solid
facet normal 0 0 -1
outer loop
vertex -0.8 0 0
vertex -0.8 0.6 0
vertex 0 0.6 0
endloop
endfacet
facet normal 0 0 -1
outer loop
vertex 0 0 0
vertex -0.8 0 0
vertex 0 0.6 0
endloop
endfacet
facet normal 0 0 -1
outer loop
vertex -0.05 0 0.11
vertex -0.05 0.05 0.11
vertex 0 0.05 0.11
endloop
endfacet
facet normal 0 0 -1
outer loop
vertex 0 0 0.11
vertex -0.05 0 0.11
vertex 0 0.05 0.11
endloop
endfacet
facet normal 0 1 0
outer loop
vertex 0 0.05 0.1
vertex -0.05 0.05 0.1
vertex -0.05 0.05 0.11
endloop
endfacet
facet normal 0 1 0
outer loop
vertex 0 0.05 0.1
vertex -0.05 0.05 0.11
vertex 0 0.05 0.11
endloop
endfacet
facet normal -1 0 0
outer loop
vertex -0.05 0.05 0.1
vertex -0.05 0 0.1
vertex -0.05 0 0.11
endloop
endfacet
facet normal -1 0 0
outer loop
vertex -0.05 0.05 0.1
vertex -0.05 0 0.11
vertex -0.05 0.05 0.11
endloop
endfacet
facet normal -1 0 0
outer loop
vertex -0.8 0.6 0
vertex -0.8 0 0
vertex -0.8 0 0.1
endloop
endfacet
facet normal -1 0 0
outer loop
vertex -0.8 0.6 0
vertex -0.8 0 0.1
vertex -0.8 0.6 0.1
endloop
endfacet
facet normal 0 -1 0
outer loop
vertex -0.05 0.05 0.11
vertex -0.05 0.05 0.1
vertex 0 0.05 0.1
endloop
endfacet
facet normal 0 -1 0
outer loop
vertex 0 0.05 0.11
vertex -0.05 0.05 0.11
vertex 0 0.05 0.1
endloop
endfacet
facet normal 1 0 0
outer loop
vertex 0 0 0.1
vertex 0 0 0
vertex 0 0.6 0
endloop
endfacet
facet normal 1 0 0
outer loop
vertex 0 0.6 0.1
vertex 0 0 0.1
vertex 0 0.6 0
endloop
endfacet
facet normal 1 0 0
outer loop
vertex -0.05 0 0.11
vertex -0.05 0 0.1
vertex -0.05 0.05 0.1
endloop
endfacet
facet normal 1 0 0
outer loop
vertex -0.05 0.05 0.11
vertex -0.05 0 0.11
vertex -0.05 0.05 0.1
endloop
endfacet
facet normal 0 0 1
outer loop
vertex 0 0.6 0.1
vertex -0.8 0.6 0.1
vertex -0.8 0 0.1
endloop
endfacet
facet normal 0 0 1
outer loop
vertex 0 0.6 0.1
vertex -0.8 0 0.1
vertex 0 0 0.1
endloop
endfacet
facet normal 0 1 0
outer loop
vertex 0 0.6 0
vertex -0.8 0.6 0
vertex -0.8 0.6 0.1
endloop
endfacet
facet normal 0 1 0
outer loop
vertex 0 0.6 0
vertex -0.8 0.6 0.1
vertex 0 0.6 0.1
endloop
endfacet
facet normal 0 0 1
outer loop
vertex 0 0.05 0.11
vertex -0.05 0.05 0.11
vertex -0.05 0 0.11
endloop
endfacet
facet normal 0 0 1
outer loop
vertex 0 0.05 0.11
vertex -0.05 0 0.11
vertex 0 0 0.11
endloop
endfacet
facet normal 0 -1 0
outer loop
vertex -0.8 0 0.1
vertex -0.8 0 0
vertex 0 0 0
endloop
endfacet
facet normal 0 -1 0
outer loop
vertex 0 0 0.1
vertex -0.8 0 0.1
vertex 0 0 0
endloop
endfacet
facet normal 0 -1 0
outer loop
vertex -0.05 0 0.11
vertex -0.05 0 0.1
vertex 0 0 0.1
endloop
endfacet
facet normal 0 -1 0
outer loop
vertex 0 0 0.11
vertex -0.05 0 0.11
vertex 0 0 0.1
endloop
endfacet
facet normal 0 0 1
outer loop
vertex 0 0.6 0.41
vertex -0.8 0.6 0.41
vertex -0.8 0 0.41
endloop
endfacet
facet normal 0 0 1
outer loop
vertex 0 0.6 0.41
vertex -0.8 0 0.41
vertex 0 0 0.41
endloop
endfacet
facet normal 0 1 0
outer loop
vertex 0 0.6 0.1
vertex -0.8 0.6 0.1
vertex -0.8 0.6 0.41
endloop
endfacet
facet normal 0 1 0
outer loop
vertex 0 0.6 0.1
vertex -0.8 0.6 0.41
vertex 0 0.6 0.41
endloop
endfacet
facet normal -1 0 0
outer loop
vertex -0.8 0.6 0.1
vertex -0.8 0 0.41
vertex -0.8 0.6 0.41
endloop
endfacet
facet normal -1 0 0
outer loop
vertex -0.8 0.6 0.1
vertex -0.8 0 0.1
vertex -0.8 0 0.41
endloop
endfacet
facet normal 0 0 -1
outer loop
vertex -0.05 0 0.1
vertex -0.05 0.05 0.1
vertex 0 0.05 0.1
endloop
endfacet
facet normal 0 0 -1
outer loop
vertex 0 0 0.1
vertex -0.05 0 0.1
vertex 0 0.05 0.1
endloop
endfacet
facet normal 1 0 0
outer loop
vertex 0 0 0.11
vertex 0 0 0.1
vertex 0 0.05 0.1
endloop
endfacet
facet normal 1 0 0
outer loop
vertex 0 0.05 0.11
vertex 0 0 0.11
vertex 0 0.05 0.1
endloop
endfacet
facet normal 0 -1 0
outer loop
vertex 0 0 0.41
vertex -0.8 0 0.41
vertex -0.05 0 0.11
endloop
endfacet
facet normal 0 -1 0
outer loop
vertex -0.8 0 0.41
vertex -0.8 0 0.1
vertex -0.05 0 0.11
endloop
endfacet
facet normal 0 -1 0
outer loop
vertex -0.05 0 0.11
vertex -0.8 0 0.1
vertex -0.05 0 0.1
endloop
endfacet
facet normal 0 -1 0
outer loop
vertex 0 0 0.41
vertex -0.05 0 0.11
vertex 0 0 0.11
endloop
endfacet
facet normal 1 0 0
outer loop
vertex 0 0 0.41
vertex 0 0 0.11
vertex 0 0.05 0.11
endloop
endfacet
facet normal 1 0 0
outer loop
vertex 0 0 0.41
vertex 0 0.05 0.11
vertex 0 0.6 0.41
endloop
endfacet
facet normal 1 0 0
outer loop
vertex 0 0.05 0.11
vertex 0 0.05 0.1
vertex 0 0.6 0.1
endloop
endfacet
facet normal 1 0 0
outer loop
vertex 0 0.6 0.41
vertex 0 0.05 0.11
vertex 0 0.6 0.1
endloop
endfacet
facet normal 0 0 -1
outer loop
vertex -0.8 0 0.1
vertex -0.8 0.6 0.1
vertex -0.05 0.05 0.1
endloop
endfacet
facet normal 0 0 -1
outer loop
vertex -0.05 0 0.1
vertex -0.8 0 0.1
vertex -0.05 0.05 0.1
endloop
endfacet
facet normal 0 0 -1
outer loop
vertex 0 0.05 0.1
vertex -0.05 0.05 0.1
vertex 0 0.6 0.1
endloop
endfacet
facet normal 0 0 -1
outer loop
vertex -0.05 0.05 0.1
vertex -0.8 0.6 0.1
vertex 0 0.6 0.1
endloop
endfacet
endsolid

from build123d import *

# Parameters (mm, degrees)
F0_W     = 0.8
F0_H     = 0.6
F1_DEPTH = 0.1
F2_W     = 0.05
F2_H     = 0.05
F3_DEPTH = 0.01
F5_DEPTH = 0.01
F6_W     = 0.8
F6_H     = 0.6
F7_DEPTH = 0.3


with BuildPart() as f1:
    # F0 (on Top) → F1 (new body)
    with BuildSketch(Plane.XY):
        with Locations((-0.4, 0.3)):
            Rectangle(F0_W, F0_H)
    extrude(amount=F1_DEPTH)


with BuildPart() as f3:
    # F2 (on face) → F3 (new body)
    with BuildSketch(Plane.XY.offset(0.1)):
        with Locations((-0.025, 0.025)):
            Rectangle(F2_W, F2_H)
    extrude(amount=F3_DEPTH)


with BuildPart() as f5:
    # F4 (on face) → F5 (new body)
    with BuildSketch(Plane.XY.offset(0.1)):
        Polygon((0, 0.6), (-0.8, 0.6), (-0.8, 0), (-0.05, 0), (-0.05, 0.05), (0, 0.05), align=None)
    extrude(amount=F5_DEPTH)

    # F6 (on face) → F7 (join)
    with BuildSketch(Plane.XY.offset(0.11)):
        with Locations((-0.4, 0.3)):
            Rectangle(F6_W, F6_H)
    extrude(amount=F7_DEPTH)


solid = Compound([f1.part, f3.part, f5.part])
